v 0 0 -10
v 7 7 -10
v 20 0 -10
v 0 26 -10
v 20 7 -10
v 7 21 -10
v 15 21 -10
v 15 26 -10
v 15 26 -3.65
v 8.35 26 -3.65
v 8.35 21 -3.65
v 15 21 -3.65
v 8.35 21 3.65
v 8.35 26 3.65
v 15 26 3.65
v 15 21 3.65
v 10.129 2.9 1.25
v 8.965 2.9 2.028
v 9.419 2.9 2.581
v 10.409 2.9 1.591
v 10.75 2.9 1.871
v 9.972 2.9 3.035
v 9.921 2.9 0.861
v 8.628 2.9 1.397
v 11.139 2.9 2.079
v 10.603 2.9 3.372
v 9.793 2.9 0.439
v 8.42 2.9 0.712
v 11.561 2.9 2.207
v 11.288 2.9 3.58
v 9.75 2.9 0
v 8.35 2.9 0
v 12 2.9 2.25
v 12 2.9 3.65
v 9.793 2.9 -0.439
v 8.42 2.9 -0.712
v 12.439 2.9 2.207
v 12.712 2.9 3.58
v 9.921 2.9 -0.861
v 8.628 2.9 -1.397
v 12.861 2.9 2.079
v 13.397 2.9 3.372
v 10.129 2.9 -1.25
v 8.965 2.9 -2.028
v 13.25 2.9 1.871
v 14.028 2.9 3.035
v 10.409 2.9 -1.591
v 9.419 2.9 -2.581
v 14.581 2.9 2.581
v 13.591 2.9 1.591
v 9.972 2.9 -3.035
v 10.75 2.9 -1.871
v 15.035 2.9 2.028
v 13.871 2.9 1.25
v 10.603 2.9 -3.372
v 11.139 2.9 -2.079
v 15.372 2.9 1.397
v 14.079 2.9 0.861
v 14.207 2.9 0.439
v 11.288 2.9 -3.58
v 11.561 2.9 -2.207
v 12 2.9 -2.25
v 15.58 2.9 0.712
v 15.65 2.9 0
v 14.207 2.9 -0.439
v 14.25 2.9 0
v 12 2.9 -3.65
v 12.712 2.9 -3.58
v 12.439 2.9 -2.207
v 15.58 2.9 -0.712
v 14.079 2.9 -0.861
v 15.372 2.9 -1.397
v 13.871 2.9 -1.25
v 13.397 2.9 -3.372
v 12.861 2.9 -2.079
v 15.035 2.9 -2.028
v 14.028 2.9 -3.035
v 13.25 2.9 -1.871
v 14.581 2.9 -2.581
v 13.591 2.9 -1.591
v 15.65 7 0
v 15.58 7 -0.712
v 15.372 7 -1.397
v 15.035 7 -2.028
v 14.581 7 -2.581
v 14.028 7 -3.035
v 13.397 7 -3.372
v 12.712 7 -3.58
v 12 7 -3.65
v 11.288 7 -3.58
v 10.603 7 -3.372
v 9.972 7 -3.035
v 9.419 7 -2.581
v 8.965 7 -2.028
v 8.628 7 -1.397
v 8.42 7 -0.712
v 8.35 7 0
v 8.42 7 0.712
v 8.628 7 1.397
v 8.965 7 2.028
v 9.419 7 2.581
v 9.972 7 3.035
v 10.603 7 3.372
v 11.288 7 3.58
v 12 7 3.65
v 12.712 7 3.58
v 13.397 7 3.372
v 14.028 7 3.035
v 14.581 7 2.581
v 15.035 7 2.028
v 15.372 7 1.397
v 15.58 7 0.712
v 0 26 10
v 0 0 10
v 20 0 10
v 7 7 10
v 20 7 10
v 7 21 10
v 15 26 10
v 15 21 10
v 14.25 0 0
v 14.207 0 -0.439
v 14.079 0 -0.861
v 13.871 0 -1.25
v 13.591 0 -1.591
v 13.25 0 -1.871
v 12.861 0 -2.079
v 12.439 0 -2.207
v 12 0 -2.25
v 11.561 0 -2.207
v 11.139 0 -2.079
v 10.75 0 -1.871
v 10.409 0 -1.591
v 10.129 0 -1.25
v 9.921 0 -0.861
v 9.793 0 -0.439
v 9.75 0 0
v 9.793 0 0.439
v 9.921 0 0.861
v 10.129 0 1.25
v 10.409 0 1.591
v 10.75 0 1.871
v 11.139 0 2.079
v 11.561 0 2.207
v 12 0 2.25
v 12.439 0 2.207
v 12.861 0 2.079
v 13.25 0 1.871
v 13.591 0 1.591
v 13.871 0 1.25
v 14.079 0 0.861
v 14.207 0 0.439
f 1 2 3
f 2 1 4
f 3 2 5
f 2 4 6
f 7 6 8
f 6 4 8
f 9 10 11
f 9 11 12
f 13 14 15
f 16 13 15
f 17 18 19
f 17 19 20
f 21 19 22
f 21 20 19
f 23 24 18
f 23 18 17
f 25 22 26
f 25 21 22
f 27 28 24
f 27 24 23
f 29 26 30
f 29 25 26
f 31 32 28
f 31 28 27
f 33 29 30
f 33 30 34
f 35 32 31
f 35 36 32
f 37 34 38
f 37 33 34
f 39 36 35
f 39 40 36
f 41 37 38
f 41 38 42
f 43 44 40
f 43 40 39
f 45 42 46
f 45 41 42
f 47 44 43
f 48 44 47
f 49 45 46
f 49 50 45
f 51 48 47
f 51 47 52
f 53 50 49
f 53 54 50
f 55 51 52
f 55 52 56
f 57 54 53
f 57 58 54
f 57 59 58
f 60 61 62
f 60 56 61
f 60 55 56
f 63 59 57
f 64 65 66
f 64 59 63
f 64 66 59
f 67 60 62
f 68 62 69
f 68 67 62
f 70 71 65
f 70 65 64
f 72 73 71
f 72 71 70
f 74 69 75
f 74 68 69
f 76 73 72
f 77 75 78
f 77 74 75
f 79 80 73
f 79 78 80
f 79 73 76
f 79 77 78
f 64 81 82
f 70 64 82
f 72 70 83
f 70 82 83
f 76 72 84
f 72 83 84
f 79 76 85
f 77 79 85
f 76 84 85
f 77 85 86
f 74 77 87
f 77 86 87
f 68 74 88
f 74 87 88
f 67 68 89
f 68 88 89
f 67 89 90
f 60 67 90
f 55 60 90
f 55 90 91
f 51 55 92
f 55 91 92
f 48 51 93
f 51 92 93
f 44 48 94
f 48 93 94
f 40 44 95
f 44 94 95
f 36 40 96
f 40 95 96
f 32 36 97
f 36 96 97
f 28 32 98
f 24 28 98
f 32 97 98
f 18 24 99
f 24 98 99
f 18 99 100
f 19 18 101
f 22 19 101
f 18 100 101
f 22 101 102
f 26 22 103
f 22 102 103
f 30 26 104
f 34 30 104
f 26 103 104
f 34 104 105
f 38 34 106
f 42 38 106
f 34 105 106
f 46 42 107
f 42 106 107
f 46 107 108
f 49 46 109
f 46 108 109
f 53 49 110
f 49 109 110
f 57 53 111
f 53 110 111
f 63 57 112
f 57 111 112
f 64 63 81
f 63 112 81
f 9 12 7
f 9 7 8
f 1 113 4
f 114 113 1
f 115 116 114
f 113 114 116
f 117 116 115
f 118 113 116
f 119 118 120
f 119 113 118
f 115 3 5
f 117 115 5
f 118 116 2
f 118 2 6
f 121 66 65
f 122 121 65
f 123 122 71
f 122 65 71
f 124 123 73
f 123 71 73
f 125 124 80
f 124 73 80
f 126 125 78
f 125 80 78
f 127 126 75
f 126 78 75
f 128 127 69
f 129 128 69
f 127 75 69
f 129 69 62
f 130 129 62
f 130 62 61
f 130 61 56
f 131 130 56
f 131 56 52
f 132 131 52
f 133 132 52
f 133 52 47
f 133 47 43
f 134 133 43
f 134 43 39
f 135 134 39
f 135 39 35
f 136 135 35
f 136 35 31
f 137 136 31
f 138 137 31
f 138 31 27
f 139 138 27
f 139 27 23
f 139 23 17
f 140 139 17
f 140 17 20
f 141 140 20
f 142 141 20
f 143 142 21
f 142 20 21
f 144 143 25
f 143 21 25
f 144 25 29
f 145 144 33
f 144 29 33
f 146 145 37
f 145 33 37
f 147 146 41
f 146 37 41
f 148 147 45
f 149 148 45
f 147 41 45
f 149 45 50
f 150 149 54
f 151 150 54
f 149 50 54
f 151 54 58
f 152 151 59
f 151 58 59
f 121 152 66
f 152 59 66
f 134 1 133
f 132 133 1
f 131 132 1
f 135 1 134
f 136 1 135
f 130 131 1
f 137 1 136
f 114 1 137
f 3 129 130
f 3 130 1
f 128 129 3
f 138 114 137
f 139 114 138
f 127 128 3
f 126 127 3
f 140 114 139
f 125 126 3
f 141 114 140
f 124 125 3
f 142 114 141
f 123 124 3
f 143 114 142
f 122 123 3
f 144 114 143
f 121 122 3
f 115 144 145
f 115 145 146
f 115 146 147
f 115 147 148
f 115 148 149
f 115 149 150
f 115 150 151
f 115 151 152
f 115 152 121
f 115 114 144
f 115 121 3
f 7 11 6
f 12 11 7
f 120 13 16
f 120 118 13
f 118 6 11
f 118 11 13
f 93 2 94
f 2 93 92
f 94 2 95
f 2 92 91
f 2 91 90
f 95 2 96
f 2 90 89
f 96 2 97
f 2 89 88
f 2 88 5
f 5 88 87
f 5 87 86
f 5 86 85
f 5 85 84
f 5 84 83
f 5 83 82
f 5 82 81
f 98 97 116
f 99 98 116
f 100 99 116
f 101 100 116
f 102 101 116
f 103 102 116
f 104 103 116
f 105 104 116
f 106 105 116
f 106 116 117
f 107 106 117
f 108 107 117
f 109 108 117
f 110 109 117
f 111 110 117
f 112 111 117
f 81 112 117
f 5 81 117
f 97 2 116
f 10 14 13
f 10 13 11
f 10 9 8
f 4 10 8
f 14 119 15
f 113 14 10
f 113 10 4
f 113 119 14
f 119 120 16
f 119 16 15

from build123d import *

# Parameters (mm, degrees)
SKETCH_1_W          = 7
SKETCH_1_H          = 14
SKETCH_1_W_2        = 20
SKETCH_1_H_2        = 7
EXTRUDE_1_DEPTH     = 10
SKETCH_2_R          = 3.65
CUT_EXTRUDE_1_DEPTH = 4.1
CUT_EXTRUDE_3_REACH = 28
SKETCH_4_W          = 7.3
SKETCH_4_H          = 7.3
CUT_EXTRUDE_2_REACH = 4.9
SKETCH_3_R          = 2.25


with BuildPart() as part:
    # 草圖1 → 填料-伸長1 (new body, symmetric)
    with BuildSketch(Plane.XY):
        with Locations((3.5, 14)):
            Rectangle(SKETCH_1_W, SKETCH_1_H)
        with Locations((10, 3.5)):
            Rectangle(SKETCH_1_W_2, SKETCH_1_H_2)
        Polygon((0, 26), (0, 21), (7, 21), (15, 21), (15, 26), align=None)
    extrude(amount=EXTRUDE_1_DEPTH, both=True)

    # 草圖2 → 除料-伸長1 (cut)
    with BuildSketch(Plane(origin=(0, 7, 0), x_dir=(1, 0, 0), z_dir=(0, 1, 0))):
        with Locations((12, 0)):
            Circle(SKETCH_2_R)
    extrude(amount=-CUT_EXTRUDE_1_DEPTH, mode=Mode.SUBTRACT)

    # 草圖4 → 除料-伸長3 (cut, up to next)
    with BuildSketch(Plane(origin=(0, 26, 0), x_dir=(1, 0, 0), z_dir=(0, 1, 0)), mode=Mode.PRIVATE) as cut_extrude_3_sk1:
        with Locations((12, 0)):
            Rectangle(SKETCH_4_W, SKETCH_4_H)
    cut_extrude_3_tool1 = extrude(cut_extrude_3_sk1.sketch, amount=-CUT_EXTRUDE_3_REACH, mode=Mode.PRIVATE) & part.part
    add(cut_extrude_3_tool1.solids().sort_by_distance((12, 26, 0))[0], mode=Mode.SUBTRACT)

    # 草圖3 → 除料-伸長2 (cut, up to next)
    with BuildSketch(Plane(origin=(0, 2.9, 0), x_dir=(1, 0, 0), z_dir=(0, 1, 0)), mode=Mode.PRIVATE) as cut_extrude_2_sk1:
        with Locations((12, 0)):
            Circle(SKETCH_3_R)
    cut_extrude_2_tool1 = extrude(cut_extrude_2_sk1.sketch, amount=-CUT_EXTRUDE_2_REACH, mode=Mode.PRIVATE) & part.part
    add(cut_extrude_2_tool1.solids().sort_by_distance((12, 2.9, 0))[0], mode=Mode.SUBTRACT)


solid = part.part
